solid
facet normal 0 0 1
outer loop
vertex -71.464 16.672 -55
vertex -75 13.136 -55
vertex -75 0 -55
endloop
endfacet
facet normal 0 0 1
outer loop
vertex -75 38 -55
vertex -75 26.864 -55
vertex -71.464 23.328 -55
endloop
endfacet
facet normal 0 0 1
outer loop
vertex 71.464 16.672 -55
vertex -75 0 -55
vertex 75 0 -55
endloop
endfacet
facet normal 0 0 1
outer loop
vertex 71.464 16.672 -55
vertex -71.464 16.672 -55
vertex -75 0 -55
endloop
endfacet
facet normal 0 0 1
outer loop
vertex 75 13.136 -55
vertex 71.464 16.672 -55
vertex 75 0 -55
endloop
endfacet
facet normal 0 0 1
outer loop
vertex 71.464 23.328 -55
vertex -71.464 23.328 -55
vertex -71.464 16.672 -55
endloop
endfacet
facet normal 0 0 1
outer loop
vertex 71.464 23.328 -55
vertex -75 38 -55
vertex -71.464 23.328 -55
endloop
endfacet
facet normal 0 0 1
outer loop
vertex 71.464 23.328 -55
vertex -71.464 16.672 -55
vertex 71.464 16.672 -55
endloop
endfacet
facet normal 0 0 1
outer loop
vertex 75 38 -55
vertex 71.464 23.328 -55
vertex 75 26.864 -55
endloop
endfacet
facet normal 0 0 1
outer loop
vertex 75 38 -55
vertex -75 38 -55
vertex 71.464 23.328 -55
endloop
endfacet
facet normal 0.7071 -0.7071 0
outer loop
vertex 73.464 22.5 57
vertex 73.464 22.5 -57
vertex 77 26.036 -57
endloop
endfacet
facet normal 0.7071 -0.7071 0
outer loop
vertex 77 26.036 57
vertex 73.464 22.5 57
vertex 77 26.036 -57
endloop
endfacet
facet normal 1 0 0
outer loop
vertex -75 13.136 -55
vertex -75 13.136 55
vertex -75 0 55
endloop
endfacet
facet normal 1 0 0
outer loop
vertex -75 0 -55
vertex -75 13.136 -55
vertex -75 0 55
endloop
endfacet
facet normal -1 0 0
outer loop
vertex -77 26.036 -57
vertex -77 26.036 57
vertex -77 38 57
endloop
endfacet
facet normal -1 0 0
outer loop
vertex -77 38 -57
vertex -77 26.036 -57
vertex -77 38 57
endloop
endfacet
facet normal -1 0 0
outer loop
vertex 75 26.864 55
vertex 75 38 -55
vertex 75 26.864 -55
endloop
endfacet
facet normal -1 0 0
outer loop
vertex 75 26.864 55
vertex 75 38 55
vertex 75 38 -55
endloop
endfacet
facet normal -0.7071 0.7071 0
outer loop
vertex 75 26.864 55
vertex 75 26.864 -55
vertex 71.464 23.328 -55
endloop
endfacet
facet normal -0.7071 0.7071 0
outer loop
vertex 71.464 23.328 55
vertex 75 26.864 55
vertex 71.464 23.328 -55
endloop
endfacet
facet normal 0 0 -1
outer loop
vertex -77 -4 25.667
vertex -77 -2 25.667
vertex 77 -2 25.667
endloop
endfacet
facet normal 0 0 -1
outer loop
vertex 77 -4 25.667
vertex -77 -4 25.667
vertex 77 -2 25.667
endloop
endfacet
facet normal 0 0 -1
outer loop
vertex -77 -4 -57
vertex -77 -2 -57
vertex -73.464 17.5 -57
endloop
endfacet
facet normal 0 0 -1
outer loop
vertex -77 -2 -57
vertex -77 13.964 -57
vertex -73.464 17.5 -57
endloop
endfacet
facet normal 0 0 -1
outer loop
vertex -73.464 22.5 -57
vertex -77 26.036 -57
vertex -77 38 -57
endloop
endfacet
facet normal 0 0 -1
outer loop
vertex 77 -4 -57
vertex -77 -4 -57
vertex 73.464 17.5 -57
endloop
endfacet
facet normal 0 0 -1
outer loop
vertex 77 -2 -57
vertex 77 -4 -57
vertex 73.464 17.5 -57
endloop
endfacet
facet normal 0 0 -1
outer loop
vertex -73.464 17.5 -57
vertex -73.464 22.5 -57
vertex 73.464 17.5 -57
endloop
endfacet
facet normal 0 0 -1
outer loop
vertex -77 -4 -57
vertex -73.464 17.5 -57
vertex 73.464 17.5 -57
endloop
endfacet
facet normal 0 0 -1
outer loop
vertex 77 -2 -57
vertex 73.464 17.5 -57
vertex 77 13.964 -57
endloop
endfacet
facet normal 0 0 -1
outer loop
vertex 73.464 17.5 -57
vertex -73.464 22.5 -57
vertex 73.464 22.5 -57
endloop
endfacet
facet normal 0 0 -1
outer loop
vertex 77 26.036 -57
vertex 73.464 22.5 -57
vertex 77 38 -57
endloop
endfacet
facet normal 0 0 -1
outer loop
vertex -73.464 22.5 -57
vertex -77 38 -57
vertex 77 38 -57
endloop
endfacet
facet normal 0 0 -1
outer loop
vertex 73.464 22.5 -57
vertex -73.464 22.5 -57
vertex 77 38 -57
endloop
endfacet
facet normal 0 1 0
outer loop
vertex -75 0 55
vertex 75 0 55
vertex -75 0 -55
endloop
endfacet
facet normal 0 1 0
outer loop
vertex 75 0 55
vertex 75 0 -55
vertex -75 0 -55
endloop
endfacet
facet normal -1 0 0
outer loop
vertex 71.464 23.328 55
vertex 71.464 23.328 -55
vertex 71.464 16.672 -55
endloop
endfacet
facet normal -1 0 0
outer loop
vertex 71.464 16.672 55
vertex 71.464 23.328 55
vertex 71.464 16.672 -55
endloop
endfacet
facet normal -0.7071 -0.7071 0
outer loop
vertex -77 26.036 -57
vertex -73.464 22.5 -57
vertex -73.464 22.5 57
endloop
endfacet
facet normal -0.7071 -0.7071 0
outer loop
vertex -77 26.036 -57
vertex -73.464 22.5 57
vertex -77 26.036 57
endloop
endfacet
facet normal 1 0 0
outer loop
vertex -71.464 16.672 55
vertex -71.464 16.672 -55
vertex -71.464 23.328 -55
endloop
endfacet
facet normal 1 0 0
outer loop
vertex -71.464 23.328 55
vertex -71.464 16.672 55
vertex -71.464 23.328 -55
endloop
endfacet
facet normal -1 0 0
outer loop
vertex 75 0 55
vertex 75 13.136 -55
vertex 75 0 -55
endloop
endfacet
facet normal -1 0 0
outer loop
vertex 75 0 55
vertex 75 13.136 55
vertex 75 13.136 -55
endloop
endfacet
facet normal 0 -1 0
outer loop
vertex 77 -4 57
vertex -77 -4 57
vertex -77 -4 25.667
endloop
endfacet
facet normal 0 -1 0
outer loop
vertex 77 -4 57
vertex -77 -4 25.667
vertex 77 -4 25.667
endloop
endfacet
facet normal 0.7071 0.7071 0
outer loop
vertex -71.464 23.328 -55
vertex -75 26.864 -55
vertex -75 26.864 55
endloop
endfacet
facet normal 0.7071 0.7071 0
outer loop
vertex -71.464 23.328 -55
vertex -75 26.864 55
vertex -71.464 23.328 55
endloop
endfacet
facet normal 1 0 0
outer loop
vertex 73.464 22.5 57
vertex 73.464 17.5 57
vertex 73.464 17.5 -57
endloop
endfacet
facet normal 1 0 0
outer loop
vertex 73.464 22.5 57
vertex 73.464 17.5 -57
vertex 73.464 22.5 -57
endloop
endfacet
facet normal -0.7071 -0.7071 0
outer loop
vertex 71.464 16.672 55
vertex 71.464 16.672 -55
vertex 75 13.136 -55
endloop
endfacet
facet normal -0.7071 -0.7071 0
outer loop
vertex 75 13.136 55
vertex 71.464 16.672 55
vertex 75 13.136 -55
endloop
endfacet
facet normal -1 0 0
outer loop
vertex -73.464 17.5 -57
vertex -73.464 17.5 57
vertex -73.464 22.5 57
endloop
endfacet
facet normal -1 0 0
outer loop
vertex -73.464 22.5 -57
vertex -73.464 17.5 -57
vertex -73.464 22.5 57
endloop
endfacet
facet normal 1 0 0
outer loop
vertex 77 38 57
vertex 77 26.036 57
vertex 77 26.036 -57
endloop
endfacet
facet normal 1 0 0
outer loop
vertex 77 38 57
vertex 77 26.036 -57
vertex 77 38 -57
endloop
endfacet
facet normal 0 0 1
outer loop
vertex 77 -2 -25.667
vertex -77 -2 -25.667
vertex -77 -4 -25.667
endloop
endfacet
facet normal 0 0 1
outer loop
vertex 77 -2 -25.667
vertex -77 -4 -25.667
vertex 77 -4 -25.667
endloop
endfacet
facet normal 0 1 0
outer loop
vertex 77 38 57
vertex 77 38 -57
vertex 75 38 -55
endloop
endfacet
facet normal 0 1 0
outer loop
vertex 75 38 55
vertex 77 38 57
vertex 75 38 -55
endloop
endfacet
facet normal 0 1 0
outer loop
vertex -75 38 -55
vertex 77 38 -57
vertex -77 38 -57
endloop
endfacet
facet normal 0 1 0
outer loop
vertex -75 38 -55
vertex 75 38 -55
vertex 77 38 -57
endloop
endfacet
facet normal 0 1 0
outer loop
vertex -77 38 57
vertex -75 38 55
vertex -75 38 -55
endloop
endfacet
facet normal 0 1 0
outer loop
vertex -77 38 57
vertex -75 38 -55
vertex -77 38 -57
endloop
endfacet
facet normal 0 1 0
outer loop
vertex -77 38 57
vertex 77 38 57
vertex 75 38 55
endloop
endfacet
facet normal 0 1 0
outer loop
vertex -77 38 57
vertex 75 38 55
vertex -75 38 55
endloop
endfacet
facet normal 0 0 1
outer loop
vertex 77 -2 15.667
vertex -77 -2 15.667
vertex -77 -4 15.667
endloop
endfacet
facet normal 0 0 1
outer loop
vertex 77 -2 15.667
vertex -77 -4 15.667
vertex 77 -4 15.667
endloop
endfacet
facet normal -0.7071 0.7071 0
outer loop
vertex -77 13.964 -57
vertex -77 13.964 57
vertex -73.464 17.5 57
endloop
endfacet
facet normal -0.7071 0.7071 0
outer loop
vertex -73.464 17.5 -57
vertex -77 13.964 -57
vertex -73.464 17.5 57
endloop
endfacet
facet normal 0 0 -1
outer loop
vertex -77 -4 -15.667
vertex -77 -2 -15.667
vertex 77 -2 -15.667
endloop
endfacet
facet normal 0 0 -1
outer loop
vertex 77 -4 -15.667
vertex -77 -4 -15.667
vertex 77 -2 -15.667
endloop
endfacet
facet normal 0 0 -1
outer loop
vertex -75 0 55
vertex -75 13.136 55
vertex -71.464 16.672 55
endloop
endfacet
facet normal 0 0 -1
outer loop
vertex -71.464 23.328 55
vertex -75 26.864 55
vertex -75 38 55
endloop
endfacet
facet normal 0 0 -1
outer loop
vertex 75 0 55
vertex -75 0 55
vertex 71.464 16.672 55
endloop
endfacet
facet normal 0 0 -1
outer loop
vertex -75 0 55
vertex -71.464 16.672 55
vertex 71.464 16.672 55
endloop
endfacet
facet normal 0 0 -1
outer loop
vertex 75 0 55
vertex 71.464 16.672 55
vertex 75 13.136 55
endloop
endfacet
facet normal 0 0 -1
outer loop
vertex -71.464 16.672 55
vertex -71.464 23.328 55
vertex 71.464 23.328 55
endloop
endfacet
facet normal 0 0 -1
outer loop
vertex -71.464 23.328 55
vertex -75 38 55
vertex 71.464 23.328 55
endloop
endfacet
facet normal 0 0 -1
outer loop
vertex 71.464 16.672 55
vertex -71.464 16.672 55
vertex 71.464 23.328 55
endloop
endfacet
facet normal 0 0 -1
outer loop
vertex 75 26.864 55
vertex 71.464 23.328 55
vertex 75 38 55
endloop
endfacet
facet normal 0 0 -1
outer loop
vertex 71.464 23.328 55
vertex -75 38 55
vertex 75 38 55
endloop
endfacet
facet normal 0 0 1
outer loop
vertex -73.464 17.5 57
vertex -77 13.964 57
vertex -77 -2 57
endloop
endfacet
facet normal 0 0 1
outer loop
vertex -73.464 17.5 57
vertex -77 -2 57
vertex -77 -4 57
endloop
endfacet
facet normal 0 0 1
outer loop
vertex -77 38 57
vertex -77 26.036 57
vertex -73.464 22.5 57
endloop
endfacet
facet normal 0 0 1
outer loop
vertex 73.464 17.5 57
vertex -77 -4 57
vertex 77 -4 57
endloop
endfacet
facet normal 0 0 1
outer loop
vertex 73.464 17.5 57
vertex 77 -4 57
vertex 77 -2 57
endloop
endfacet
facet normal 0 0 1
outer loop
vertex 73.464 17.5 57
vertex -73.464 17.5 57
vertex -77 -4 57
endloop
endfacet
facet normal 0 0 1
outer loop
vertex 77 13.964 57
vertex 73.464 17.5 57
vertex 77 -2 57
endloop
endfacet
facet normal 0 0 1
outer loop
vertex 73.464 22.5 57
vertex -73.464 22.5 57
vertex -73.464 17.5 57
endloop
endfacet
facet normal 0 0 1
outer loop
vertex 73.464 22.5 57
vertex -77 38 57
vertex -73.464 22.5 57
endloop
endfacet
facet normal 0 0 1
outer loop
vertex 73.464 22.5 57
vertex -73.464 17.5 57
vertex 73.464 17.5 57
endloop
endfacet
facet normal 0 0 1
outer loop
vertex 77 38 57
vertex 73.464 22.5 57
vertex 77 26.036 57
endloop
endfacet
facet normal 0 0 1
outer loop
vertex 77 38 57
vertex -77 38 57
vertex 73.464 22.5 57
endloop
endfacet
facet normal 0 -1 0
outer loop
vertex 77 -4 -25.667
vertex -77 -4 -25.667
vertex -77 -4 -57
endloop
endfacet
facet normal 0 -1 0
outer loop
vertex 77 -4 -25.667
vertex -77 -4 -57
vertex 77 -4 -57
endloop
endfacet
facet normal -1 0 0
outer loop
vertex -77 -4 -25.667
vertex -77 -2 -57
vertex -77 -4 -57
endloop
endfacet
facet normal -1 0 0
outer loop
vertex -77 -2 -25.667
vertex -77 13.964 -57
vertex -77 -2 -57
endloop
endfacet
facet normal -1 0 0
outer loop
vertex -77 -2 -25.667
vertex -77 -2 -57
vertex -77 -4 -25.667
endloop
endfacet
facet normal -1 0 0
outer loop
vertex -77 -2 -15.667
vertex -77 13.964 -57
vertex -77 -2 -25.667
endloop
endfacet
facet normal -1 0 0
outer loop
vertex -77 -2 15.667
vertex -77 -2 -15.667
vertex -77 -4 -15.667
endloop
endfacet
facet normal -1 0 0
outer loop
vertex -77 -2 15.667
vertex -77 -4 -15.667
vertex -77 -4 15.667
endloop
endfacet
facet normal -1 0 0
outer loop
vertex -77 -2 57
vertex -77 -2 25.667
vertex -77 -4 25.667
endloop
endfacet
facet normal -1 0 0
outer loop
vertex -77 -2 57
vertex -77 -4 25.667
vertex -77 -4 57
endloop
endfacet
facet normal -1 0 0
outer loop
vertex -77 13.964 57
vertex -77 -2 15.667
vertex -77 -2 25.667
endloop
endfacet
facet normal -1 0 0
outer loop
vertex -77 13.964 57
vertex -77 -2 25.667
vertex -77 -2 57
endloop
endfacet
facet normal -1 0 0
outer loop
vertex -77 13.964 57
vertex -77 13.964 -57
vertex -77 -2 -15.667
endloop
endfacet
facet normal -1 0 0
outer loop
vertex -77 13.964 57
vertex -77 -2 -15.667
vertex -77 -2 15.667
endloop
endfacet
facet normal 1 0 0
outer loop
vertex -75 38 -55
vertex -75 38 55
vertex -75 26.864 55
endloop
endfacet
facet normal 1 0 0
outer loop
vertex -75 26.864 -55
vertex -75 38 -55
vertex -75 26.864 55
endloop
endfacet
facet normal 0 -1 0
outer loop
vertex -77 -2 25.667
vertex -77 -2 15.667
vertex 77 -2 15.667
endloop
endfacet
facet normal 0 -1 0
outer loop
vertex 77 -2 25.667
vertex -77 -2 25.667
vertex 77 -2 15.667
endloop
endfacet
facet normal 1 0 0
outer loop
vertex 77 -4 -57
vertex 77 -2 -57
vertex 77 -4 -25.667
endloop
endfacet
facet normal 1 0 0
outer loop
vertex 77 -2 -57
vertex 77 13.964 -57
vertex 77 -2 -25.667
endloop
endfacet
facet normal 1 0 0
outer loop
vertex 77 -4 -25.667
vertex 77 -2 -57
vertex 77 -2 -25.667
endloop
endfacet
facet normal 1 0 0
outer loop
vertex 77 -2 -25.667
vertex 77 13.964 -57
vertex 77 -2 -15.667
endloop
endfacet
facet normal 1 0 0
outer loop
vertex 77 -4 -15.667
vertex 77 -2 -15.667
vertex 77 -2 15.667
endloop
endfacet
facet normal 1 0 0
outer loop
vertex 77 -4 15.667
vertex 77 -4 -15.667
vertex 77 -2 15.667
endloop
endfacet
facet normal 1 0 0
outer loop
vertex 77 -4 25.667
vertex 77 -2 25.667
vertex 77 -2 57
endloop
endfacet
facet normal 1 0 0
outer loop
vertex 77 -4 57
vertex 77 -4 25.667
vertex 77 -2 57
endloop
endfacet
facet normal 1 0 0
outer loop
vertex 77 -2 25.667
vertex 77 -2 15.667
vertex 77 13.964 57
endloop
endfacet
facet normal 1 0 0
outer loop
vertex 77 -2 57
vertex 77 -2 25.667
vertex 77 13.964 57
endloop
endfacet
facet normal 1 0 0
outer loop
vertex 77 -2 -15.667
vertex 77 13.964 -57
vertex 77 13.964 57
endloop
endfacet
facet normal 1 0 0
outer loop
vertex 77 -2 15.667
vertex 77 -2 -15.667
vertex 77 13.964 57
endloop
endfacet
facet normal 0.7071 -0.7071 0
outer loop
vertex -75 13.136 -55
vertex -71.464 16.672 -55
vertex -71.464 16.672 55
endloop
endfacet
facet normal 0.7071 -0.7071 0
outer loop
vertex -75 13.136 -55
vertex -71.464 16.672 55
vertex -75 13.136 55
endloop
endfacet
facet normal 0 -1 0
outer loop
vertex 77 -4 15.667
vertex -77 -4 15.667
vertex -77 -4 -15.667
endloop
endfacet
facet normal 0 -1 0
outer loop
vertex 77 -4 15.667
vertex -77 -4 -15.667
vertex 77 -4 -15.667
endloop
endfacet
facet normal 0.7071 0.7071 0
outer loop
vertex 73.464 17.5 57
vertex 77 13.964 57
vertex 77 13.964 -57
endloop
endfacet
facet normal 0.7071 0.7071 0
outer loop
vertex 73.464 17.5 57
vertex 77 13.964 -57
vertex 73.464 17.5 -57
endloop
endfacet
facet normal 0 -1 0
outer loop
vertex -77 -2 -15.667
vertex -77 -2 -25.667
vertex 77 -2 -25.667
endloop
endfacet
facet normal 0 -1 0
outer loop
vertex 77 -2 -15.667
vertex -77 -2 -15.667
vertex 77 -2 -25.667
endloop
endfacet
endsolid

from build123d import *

# Parameters (mm, degrees)
SKETCH1_W                       = 154
SKETCH1_H                       = 114
SKETCH1_W_2                     = 150
SKETCH1_H_2                     = 110
BOSS_EXTRUDE1_DEPTH             = 2
BOSS_EXTRUDE2_REACH             = 97.823
BOSS_EXTRUDE2_DIRECTION_2_REACH = 97.823
BOSS_EXTRUDE3_DEPTH             = 2
SKETCH4_W                       = 154
SKETCH4_H                       = 31.333333333
SKETCH4_H_2                     = 31.333333334
BOSS_EXTRUDE4_DEPTH             = 2


with BuildPart() as part:
    # Sketch1 → Boss-Extrude1 (new body)
    # profile 1 of 3: a face of its own
    with BuildSketch(Plane(origin=(0, 0, 0), x_dir=(1, 0, 0), z_dir=(0, 1, 0))):
        Rectangle(SKETCH1_W, SKETCH1_H)
        Rectangle(SKETCH1_W_2, SKETCH1_H_2, mode=Mode.SUBTRACT)
    # profile 2 of 3: a face of its own
    with BuildSketch(Plane(origin=(0, 0, 0), x_dir=(1, 0, 0), z_dir=(0, 1, 0))):
        Polygon((-75, 55), (-75, -55), (75, -55), align=None)
    # profile 3 of 3: a face of its own
    with BuildSketch(Plane(origin=(0, 0, 0), x_dir=(1, 0, 0), z_dir=(0, 1, 0))):
        Polygon((75, 55), (75, -55), (-75, 55), align=None)
    extrude(amount=-BOSS_EXTRUDE1_DEPTH)

    # Boss-Extrude2: up to this face of the body (flat: up to its plane)
    boss_extrude2_end = Plane(part.part.faces().sort_by_distance((0, -1, 57))[0])
    # Sketch2 → Boss-Extrude2 (add, up to the picked face)
    with BuildSketch(Plane.XY, mode=Mode.PRIVATE) as boss_extrude2_sk1:
        Polygon((-77, 0), (-77, 13.964466094), (-73.464466094, 17.5), (-73.464466094, 22.5), (-77, 26.035533906), (-77, 38), (-75, 38), (-75, 26.863961031), (-71.464466094, 23.328427125), (-71.464466094, 22.5), (-71.464466094, 17.5), (-71.464466094, 16.671572875), (-75, 13.136038969), (-75, 0), align=None)
    boss_extrude2_tool1 = split(extrude(boss_extrude2_sk1.sketch, amount=BOSS_EXTRUDE2_REACH, mode=Mode.PRIVATE), bisect_by=boss_extrude2_end, keep=Keep.BOTH, mode=Mode.PRIVATE)
    # Sketch2 → Boss-Extrude2 (add, up to the picked face)
    with BuildSketch(Plane.XY, mode=Mode.PRIVATE) as boss_extrude2_sk2:
        Polygon((75, 38), (75, 26.863961031), (71.464466094, 23.328427125), (71.464466094, 22.5), (71.464466094, 17.5), (71.464466094, 16.671572875), (75, 13.136038969), (75, 0), (77, 0), (77, 13.964466094), (73.464466094, 17.5), (73.464466094, 22.5), (77, 26.035533906), (77, 38), align=None)
    boss_extrude2_tool2 = split(extrude(boss_extrude2_sk2.sketch, amount=BOSS_EXTRUDE2_REACH, mode=Mode.PRIVATE), bisect_by=boss_extrude2_end, keep=Keep.BOTH, mode=Mode.PRIVATE)
    add(boss_extrude2_tool1.solids().sort_by(Axis((-76.615989, 6.982233, 0), (0, 0, 1)))[0])
    add(boss_extrude2_tool2.solids().sort_by(Axis((75.384011, 32.431981, 0), (0, 0, 1)))[0])

    # Boss-Extrude2 direction 2: up to this face of the body (flat: up to its plane)
    boss_extrude2_direction_2_end = Plane(part.part.faces().sort_by_distance((0, -1, -57))[0])
    # Sketch2 → Boss-Extrude2 direction 2 (add, up to the picked face)
    with BuildSketch(Plane.XY, mode=Mode.PRIVATE) as boss_extrude2_direction_2_sk1:
        Polygon((-77, 0), (-77, 13.964466094), (-73.464466094, 17.5), (-73.464466094, 22.5), (-77, 26.035533906), (-77, 38), (-75, 38), (-75, 26.863961031), (-71.464466094, 23.328427125), (-71.464466094, 22.5), (-71.464466094, 17.5), (-71.464466094, 16.671572875), (-75, 13.136038969), (-75, 0), align=None)
    boss_extrude2_direction_2_tool1 = split(extrude(boss_extrude2_direction_2_sk1.sketch, amount=-BOSS_EXTRUDE2_DIRECTION_2_REACH, mode=Mode.PRIVATE), bisect_by=boss_extrude2_direction_2_end, keep=Keep.BOTH, mode=Mode.PRIVATE)
    # Sketch2 → Boss-Extrude2 direction 2 (add, up to the picked face)
    with BuildSketch(Plane.XY, mode=Mode.PRIVATE) as boss_extrude2_direction_2_sk2:
        Polygon((75, 38), (75, 26.863961031), (71.464466094, 23.328427125), (71.464466094, 22.5), (71.464466094, 17.5), (71.464466094, 16.671572875), (75, 13.136038969), (75, 0), (77, 0), (77, 13.964466094), (73.464466094, 17.5), (73.464466094, 22.5), (77, 26.035533906), (77, 38), align=None)
    boss_extrude2_direction_2_tool2 = split(extrude(boss_extrude2_direction_2_sk2.sketch, amount=-BOSS_EXTRUDE2_DIRECTION_2_REACH, mode=Mode.PRIVATE), bisect_by=boss_extrude2_direction_2_end, keep=Keep.BOTH, mode=Mode.PRIVATE)
    add(boss_extrude2_direction_2_tool1.solids().sort_by(Axis((-76.615989, 6.982233, 0), (0, 0, -1)))[0])
    add(boss_extrude2_direction_2_tool2.solids().sort_by(Axis((75.384011, 32.431981, 0), (0, 0, -1)))[0])

    # Sketch3 → Boss-Extrude3 (add)
    with BuildSketch(Plane(origin=(0, 0, -57), x_dir=(-1, 0, 0), z_dir=(0, 0, -1))):
        Polygon((-75, 38), (75, 38), (75, 26.863961031), (71.464466094, 23.328427125), (71.464466094, 16.671572875), (75, 13.136038969), (75, 0), (-75, 0), (-75, 13.136038969), (-71.464466094, 16.671572875), (-71.464466094, 23.328427125), (-75, 26.863961031), align=None)
    boss_extrude3 = extrude(amount=-BOSS_EXTRUDE3_DEPTH)

    # Mirror1: Boss-Extrude3 across plane
    add(boss_extrude3.mirror(Plane.XY))

    # Sketch4 → Boss-Extrude4 (add)
    with BuildSketch(Plane.XZ.offset(2)):
        with Locations((0, -41.333333334)):
            Rectangle(SKETCH4_W, SKETCH4_H)
        Rectangle(SKETCH4_W, SKETCH4_H_2)
        with Locations((0, 41.333333334)):
            Rectangle(SKETCH4_W, SKETCH4_H)
    extrude(amount=BOSS_EXTRUDE4_DEPTH)


solid = part.part
